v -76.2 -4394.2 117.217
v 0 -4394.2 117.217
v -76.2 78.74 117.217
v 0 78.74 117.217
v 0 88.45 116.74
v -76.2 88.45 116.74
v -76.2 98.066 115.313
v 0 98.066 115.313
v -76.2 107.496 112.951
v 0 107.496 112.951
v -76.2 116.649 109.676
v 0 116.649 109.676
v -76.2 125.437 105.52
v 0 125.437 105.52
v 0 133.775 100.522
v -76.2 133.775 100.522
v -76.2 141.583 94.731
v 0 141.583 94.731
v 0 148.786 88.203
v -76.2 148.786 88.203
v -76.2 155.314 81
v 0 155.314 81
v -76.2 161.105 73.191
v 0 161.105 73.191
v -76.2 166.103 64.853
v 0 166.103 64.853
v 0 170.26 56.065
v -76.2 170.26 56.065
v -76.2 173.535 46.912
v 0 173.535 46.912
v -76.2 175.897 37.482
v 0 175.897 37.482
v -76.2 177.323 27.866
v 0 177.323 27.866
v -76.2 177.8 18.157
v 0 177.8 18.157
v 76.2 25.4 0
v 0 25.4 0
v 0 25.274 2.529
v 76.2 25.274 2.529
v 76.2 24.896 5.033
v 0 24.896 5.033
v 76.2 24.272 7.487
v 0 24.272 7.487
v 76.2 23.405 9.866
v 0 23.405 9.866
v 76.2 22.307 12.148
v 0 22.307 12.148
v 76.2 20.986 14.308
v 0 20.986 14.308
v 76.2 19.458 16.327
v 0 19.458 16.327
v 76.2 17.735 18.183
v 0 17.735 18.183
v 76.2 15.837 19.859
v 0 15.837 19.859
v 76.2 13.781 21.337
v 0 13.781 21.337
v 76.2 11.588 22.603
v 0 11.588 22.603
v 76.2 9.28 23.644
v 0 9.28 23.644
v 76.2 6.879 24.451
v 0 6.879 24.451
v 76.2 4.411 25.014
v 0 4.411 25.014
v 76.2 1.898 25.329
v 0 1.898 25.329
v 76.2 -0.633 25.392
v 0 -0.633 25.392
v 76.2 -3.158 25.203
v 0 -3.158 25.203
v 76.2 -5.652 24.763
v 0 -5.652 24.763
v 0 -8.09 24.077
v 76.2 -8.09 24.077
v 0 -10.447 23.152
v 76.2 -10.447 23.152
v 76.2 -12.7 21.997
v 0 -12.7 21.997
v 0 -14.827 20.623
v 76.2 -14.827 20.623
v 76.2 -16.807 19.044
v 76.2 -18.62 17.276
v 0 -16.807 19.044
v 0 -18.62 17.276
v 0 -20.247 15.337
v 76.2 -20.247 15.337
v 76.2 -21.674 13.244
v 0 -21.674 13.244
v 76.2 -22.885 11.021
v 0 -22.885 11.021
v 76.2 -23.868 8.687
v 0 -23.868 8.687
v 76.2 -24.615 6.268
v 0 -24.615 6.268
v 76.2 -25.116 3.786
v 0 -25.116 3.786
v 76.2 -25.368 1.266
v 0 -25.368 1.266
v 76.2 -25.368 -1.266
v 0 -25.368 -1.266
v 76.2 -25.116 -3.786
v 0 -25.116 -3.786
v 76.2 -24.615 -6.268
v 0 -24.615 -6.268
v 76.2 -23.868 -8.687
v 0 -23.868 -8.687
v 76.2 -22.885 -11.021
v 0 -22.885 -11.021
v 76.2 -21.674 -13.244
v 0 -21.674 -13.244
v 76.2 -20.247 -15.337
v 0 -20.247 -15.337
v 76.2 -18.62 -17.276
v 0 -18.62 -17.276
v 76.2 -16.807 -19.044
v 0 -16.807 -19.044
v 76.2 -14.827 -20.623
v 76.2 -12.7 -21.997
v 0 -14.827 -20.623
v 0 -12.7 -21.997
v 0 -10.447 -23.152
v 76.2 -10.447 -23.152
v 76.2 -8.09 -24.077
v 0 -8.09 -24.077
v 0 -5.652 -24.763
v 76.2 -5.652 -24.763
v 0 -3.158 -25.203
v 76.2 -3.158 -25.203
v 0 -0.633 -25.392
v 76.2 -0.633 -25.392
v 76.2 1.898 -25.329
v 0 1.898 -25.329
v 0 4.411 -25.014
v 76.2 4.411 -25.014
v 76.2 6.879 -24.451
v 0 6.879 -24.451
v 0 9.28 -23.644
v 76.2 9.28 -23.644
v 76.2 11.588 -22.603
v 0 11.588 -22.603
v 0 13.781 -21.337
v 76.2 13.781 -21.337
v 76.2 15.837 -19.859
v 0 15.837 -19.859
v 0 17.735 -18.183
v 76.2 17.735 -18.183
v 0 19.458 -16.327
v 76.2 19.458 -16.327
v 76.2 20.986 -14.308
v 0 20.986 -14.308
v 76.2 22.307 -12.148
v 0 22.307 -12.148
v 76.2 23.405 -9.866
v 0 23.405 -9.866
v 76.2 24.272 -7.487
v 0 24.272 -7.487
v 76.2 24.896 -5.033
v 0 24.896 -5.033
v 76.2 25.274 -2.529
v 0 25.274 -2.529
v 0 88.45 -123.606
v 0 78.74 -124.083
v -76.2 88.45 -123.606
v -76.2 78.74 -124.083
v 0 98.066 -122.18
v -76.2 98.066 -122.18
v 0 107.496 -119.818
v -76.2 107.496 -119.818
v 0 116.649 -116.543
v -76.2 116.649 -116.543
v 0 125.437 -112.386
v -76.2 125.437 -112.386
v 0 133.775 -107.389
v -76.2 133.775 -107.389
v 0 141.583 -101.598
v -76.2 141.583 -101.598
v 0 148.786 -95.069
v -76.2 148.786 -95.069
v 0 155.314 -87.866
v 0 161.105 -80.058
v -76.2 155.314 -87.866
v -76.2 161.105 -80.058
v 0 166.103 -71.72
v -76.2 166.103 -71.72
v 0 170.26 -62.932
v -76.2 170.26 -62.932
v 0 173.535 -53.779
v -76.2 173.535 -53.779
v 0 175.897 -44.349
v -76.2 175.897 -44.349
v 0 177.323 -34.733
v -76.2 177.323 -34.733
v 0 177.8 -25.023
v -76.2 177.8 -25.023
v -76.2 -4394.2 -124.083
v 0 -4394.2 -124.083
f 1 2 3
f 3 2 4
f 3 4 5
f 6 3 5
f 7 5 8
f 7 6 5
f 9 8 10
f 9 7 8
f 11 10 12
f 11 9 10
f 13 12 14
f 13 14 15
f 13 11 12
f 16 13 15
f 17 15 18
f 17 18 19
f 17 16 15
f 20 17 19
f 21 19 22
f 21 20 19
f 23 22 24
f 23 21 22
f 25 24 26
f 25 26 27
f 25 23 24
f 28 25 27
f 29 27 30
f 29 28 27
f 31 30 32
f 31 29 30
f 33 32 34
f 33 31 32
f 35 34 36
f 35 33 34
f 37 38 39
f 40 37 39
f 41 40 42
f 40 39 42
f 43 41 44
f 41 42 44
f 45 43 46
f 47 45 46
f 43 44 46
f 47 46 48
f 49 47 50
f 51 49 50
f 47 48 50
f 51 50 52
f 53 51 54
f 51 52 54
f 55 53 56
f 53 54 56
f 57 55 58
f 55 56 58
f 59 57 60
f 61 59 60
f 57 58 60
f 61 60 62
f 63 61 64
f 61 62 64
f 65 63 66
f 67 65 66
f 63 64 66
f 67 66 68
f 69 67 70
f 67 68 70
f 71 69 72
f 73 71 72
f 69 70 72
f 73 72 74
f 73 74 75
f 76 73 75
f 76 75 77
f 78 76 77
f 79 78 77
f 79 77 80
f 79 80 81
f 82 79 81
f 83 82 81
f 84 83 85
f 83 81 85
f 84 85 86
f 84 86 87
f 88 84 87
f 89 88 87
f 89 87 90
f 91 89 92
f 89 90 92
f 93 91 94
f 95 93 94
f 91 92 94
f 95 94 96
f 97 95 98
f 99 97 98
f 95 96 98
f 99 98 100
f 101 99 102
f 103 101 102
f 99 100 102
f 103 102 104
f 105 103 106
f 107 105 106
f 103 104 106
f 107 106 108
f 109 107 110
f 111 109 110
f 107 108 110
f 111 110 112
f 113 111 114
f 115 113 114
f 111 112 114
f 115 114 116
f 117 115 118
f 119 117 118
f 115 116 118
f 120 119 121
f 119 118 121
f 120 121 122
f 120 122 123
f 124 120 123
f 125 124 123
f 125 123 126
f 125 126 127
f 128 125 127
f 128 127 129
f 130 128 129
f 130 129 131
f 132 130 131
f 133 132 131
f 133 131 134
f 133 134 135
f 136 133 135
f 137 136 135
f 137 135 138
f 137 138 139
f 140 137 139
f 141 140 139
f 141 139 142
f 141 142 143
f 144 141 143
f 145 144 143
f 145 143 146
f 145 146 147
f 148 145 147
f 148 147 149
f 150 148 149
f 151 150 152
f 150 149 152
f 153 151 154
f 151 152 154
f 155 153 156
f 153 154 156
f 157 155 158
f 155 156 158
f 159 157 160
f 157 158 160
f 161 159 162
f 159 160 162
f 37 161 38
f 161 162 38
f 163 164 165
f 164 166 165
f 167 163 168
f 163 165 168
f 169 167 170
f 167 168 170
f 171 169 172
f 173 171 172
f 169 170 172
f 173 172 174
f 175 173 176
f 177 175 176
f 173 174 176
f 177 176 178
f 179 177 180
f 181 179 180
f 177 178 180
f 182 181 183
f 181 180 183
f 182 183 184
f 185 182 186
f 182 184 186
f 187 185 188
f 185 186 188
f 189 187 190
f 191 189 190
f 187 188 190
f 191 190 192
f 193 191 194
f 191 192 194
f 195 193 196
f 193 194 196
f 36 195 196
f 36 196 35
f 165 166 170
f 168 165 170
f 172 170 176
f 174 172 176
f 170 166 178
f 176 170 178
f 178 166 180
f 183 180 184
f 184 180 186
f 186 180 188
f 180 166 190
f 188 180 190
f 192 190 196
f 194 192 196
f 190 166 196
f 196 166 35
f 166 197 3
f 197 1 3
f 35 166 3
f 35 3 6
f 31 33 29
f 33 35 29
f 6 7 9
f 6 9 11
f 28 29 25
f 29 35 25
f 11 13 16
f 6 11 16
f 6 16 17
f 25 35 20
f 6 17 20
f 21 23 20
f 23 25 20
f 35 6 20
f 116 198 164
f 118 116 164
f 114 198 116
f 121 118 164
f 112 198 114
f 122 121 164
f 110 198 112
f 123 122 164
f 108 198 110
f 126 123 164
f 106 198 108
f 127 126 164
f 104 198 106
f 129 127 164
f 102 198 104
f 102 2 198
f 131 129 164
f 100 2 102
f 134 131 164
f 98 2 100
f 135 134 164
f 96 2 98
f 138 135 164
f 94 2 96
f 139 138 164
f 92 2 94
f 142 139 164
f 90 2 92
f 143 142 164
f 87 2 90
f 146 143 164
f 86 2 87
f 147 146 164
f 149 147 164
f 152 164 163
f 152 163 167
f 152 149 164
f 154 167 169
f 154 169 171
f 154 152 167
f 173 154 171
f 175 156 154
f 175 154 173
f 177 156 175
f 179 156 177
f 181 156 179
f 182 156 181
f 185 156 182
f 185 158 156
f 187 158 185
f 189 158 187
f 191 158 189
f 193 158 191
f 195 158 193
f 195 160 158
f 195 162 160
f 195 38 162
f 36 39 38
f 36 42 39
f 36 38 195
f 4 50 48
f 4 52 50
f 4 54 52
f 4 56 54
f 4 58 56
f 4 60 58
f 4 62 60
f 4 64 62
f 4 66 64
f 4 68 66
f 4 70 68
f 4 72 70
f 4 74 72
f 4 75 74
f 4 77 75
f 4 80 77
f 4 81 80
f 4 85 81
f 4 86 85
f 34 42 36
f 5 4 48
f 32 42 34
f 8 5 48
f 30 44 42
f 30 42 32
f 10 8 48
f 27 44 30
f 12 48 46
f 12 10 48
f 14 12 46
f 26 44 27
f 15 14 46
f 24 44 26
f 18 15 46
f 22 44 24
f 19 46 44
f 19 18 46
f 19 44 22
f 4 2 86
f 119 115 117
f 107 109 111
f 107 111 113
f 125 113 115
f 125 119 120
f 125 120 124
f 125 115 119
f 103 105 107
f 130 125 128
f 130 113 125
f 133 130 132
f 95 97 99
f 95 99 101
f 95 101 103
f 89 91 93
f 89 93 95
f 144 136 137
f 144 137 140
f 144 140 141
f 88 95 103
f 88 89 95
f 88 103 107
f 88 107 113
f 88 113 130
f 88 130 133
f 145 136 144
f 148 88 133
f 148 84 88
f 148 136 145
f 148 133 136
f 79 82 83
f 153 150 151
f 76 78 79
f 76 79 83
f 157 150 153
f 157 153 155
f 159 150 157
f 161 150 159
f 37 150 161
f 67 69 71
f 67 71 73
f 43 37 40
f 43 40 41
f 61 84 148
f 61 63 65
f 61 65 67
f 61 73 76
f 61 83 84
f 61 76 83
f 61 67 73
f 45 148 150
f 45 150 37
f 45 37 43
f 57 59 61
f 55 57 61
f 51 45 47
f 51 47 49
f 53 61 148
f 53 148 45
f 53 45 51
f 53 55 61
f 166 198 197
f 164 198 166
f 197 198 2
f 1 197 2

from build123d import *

# Parameters (mm, degrees)
F0_W     = 4572
F0_H     = 241.3
F1_DEPTH = 76.2
F2_R     = 25.4
F3_DEPTH = 76.2
F4_R     = 99.06


with BuildPart() as f1:
    # F0 (on Right) → F1 (new body)
    with BuildSketch(Plane.YZ):
        with Locations((-2108.2, -3.433317)):
            Rectangle(F0_W, F0_H)
    extrude(amount=-F1_DEPTH)

    # F2 (on face) → F3 (join)
    with BuildSketch(Plane.YZ):
        Circle(F2_R)
    extrude(amount=F3_DEPTH)

    # F4
    f4_edges = [f1.edges().sort_by_distance(p)[0] for p in [
        (-38.1, 177.8, 117.216683),
        (-38.1, 177.8, -124.083317),
    ]]
    fillet(f4_edges, radius=F4_R)


solid = f1.part
